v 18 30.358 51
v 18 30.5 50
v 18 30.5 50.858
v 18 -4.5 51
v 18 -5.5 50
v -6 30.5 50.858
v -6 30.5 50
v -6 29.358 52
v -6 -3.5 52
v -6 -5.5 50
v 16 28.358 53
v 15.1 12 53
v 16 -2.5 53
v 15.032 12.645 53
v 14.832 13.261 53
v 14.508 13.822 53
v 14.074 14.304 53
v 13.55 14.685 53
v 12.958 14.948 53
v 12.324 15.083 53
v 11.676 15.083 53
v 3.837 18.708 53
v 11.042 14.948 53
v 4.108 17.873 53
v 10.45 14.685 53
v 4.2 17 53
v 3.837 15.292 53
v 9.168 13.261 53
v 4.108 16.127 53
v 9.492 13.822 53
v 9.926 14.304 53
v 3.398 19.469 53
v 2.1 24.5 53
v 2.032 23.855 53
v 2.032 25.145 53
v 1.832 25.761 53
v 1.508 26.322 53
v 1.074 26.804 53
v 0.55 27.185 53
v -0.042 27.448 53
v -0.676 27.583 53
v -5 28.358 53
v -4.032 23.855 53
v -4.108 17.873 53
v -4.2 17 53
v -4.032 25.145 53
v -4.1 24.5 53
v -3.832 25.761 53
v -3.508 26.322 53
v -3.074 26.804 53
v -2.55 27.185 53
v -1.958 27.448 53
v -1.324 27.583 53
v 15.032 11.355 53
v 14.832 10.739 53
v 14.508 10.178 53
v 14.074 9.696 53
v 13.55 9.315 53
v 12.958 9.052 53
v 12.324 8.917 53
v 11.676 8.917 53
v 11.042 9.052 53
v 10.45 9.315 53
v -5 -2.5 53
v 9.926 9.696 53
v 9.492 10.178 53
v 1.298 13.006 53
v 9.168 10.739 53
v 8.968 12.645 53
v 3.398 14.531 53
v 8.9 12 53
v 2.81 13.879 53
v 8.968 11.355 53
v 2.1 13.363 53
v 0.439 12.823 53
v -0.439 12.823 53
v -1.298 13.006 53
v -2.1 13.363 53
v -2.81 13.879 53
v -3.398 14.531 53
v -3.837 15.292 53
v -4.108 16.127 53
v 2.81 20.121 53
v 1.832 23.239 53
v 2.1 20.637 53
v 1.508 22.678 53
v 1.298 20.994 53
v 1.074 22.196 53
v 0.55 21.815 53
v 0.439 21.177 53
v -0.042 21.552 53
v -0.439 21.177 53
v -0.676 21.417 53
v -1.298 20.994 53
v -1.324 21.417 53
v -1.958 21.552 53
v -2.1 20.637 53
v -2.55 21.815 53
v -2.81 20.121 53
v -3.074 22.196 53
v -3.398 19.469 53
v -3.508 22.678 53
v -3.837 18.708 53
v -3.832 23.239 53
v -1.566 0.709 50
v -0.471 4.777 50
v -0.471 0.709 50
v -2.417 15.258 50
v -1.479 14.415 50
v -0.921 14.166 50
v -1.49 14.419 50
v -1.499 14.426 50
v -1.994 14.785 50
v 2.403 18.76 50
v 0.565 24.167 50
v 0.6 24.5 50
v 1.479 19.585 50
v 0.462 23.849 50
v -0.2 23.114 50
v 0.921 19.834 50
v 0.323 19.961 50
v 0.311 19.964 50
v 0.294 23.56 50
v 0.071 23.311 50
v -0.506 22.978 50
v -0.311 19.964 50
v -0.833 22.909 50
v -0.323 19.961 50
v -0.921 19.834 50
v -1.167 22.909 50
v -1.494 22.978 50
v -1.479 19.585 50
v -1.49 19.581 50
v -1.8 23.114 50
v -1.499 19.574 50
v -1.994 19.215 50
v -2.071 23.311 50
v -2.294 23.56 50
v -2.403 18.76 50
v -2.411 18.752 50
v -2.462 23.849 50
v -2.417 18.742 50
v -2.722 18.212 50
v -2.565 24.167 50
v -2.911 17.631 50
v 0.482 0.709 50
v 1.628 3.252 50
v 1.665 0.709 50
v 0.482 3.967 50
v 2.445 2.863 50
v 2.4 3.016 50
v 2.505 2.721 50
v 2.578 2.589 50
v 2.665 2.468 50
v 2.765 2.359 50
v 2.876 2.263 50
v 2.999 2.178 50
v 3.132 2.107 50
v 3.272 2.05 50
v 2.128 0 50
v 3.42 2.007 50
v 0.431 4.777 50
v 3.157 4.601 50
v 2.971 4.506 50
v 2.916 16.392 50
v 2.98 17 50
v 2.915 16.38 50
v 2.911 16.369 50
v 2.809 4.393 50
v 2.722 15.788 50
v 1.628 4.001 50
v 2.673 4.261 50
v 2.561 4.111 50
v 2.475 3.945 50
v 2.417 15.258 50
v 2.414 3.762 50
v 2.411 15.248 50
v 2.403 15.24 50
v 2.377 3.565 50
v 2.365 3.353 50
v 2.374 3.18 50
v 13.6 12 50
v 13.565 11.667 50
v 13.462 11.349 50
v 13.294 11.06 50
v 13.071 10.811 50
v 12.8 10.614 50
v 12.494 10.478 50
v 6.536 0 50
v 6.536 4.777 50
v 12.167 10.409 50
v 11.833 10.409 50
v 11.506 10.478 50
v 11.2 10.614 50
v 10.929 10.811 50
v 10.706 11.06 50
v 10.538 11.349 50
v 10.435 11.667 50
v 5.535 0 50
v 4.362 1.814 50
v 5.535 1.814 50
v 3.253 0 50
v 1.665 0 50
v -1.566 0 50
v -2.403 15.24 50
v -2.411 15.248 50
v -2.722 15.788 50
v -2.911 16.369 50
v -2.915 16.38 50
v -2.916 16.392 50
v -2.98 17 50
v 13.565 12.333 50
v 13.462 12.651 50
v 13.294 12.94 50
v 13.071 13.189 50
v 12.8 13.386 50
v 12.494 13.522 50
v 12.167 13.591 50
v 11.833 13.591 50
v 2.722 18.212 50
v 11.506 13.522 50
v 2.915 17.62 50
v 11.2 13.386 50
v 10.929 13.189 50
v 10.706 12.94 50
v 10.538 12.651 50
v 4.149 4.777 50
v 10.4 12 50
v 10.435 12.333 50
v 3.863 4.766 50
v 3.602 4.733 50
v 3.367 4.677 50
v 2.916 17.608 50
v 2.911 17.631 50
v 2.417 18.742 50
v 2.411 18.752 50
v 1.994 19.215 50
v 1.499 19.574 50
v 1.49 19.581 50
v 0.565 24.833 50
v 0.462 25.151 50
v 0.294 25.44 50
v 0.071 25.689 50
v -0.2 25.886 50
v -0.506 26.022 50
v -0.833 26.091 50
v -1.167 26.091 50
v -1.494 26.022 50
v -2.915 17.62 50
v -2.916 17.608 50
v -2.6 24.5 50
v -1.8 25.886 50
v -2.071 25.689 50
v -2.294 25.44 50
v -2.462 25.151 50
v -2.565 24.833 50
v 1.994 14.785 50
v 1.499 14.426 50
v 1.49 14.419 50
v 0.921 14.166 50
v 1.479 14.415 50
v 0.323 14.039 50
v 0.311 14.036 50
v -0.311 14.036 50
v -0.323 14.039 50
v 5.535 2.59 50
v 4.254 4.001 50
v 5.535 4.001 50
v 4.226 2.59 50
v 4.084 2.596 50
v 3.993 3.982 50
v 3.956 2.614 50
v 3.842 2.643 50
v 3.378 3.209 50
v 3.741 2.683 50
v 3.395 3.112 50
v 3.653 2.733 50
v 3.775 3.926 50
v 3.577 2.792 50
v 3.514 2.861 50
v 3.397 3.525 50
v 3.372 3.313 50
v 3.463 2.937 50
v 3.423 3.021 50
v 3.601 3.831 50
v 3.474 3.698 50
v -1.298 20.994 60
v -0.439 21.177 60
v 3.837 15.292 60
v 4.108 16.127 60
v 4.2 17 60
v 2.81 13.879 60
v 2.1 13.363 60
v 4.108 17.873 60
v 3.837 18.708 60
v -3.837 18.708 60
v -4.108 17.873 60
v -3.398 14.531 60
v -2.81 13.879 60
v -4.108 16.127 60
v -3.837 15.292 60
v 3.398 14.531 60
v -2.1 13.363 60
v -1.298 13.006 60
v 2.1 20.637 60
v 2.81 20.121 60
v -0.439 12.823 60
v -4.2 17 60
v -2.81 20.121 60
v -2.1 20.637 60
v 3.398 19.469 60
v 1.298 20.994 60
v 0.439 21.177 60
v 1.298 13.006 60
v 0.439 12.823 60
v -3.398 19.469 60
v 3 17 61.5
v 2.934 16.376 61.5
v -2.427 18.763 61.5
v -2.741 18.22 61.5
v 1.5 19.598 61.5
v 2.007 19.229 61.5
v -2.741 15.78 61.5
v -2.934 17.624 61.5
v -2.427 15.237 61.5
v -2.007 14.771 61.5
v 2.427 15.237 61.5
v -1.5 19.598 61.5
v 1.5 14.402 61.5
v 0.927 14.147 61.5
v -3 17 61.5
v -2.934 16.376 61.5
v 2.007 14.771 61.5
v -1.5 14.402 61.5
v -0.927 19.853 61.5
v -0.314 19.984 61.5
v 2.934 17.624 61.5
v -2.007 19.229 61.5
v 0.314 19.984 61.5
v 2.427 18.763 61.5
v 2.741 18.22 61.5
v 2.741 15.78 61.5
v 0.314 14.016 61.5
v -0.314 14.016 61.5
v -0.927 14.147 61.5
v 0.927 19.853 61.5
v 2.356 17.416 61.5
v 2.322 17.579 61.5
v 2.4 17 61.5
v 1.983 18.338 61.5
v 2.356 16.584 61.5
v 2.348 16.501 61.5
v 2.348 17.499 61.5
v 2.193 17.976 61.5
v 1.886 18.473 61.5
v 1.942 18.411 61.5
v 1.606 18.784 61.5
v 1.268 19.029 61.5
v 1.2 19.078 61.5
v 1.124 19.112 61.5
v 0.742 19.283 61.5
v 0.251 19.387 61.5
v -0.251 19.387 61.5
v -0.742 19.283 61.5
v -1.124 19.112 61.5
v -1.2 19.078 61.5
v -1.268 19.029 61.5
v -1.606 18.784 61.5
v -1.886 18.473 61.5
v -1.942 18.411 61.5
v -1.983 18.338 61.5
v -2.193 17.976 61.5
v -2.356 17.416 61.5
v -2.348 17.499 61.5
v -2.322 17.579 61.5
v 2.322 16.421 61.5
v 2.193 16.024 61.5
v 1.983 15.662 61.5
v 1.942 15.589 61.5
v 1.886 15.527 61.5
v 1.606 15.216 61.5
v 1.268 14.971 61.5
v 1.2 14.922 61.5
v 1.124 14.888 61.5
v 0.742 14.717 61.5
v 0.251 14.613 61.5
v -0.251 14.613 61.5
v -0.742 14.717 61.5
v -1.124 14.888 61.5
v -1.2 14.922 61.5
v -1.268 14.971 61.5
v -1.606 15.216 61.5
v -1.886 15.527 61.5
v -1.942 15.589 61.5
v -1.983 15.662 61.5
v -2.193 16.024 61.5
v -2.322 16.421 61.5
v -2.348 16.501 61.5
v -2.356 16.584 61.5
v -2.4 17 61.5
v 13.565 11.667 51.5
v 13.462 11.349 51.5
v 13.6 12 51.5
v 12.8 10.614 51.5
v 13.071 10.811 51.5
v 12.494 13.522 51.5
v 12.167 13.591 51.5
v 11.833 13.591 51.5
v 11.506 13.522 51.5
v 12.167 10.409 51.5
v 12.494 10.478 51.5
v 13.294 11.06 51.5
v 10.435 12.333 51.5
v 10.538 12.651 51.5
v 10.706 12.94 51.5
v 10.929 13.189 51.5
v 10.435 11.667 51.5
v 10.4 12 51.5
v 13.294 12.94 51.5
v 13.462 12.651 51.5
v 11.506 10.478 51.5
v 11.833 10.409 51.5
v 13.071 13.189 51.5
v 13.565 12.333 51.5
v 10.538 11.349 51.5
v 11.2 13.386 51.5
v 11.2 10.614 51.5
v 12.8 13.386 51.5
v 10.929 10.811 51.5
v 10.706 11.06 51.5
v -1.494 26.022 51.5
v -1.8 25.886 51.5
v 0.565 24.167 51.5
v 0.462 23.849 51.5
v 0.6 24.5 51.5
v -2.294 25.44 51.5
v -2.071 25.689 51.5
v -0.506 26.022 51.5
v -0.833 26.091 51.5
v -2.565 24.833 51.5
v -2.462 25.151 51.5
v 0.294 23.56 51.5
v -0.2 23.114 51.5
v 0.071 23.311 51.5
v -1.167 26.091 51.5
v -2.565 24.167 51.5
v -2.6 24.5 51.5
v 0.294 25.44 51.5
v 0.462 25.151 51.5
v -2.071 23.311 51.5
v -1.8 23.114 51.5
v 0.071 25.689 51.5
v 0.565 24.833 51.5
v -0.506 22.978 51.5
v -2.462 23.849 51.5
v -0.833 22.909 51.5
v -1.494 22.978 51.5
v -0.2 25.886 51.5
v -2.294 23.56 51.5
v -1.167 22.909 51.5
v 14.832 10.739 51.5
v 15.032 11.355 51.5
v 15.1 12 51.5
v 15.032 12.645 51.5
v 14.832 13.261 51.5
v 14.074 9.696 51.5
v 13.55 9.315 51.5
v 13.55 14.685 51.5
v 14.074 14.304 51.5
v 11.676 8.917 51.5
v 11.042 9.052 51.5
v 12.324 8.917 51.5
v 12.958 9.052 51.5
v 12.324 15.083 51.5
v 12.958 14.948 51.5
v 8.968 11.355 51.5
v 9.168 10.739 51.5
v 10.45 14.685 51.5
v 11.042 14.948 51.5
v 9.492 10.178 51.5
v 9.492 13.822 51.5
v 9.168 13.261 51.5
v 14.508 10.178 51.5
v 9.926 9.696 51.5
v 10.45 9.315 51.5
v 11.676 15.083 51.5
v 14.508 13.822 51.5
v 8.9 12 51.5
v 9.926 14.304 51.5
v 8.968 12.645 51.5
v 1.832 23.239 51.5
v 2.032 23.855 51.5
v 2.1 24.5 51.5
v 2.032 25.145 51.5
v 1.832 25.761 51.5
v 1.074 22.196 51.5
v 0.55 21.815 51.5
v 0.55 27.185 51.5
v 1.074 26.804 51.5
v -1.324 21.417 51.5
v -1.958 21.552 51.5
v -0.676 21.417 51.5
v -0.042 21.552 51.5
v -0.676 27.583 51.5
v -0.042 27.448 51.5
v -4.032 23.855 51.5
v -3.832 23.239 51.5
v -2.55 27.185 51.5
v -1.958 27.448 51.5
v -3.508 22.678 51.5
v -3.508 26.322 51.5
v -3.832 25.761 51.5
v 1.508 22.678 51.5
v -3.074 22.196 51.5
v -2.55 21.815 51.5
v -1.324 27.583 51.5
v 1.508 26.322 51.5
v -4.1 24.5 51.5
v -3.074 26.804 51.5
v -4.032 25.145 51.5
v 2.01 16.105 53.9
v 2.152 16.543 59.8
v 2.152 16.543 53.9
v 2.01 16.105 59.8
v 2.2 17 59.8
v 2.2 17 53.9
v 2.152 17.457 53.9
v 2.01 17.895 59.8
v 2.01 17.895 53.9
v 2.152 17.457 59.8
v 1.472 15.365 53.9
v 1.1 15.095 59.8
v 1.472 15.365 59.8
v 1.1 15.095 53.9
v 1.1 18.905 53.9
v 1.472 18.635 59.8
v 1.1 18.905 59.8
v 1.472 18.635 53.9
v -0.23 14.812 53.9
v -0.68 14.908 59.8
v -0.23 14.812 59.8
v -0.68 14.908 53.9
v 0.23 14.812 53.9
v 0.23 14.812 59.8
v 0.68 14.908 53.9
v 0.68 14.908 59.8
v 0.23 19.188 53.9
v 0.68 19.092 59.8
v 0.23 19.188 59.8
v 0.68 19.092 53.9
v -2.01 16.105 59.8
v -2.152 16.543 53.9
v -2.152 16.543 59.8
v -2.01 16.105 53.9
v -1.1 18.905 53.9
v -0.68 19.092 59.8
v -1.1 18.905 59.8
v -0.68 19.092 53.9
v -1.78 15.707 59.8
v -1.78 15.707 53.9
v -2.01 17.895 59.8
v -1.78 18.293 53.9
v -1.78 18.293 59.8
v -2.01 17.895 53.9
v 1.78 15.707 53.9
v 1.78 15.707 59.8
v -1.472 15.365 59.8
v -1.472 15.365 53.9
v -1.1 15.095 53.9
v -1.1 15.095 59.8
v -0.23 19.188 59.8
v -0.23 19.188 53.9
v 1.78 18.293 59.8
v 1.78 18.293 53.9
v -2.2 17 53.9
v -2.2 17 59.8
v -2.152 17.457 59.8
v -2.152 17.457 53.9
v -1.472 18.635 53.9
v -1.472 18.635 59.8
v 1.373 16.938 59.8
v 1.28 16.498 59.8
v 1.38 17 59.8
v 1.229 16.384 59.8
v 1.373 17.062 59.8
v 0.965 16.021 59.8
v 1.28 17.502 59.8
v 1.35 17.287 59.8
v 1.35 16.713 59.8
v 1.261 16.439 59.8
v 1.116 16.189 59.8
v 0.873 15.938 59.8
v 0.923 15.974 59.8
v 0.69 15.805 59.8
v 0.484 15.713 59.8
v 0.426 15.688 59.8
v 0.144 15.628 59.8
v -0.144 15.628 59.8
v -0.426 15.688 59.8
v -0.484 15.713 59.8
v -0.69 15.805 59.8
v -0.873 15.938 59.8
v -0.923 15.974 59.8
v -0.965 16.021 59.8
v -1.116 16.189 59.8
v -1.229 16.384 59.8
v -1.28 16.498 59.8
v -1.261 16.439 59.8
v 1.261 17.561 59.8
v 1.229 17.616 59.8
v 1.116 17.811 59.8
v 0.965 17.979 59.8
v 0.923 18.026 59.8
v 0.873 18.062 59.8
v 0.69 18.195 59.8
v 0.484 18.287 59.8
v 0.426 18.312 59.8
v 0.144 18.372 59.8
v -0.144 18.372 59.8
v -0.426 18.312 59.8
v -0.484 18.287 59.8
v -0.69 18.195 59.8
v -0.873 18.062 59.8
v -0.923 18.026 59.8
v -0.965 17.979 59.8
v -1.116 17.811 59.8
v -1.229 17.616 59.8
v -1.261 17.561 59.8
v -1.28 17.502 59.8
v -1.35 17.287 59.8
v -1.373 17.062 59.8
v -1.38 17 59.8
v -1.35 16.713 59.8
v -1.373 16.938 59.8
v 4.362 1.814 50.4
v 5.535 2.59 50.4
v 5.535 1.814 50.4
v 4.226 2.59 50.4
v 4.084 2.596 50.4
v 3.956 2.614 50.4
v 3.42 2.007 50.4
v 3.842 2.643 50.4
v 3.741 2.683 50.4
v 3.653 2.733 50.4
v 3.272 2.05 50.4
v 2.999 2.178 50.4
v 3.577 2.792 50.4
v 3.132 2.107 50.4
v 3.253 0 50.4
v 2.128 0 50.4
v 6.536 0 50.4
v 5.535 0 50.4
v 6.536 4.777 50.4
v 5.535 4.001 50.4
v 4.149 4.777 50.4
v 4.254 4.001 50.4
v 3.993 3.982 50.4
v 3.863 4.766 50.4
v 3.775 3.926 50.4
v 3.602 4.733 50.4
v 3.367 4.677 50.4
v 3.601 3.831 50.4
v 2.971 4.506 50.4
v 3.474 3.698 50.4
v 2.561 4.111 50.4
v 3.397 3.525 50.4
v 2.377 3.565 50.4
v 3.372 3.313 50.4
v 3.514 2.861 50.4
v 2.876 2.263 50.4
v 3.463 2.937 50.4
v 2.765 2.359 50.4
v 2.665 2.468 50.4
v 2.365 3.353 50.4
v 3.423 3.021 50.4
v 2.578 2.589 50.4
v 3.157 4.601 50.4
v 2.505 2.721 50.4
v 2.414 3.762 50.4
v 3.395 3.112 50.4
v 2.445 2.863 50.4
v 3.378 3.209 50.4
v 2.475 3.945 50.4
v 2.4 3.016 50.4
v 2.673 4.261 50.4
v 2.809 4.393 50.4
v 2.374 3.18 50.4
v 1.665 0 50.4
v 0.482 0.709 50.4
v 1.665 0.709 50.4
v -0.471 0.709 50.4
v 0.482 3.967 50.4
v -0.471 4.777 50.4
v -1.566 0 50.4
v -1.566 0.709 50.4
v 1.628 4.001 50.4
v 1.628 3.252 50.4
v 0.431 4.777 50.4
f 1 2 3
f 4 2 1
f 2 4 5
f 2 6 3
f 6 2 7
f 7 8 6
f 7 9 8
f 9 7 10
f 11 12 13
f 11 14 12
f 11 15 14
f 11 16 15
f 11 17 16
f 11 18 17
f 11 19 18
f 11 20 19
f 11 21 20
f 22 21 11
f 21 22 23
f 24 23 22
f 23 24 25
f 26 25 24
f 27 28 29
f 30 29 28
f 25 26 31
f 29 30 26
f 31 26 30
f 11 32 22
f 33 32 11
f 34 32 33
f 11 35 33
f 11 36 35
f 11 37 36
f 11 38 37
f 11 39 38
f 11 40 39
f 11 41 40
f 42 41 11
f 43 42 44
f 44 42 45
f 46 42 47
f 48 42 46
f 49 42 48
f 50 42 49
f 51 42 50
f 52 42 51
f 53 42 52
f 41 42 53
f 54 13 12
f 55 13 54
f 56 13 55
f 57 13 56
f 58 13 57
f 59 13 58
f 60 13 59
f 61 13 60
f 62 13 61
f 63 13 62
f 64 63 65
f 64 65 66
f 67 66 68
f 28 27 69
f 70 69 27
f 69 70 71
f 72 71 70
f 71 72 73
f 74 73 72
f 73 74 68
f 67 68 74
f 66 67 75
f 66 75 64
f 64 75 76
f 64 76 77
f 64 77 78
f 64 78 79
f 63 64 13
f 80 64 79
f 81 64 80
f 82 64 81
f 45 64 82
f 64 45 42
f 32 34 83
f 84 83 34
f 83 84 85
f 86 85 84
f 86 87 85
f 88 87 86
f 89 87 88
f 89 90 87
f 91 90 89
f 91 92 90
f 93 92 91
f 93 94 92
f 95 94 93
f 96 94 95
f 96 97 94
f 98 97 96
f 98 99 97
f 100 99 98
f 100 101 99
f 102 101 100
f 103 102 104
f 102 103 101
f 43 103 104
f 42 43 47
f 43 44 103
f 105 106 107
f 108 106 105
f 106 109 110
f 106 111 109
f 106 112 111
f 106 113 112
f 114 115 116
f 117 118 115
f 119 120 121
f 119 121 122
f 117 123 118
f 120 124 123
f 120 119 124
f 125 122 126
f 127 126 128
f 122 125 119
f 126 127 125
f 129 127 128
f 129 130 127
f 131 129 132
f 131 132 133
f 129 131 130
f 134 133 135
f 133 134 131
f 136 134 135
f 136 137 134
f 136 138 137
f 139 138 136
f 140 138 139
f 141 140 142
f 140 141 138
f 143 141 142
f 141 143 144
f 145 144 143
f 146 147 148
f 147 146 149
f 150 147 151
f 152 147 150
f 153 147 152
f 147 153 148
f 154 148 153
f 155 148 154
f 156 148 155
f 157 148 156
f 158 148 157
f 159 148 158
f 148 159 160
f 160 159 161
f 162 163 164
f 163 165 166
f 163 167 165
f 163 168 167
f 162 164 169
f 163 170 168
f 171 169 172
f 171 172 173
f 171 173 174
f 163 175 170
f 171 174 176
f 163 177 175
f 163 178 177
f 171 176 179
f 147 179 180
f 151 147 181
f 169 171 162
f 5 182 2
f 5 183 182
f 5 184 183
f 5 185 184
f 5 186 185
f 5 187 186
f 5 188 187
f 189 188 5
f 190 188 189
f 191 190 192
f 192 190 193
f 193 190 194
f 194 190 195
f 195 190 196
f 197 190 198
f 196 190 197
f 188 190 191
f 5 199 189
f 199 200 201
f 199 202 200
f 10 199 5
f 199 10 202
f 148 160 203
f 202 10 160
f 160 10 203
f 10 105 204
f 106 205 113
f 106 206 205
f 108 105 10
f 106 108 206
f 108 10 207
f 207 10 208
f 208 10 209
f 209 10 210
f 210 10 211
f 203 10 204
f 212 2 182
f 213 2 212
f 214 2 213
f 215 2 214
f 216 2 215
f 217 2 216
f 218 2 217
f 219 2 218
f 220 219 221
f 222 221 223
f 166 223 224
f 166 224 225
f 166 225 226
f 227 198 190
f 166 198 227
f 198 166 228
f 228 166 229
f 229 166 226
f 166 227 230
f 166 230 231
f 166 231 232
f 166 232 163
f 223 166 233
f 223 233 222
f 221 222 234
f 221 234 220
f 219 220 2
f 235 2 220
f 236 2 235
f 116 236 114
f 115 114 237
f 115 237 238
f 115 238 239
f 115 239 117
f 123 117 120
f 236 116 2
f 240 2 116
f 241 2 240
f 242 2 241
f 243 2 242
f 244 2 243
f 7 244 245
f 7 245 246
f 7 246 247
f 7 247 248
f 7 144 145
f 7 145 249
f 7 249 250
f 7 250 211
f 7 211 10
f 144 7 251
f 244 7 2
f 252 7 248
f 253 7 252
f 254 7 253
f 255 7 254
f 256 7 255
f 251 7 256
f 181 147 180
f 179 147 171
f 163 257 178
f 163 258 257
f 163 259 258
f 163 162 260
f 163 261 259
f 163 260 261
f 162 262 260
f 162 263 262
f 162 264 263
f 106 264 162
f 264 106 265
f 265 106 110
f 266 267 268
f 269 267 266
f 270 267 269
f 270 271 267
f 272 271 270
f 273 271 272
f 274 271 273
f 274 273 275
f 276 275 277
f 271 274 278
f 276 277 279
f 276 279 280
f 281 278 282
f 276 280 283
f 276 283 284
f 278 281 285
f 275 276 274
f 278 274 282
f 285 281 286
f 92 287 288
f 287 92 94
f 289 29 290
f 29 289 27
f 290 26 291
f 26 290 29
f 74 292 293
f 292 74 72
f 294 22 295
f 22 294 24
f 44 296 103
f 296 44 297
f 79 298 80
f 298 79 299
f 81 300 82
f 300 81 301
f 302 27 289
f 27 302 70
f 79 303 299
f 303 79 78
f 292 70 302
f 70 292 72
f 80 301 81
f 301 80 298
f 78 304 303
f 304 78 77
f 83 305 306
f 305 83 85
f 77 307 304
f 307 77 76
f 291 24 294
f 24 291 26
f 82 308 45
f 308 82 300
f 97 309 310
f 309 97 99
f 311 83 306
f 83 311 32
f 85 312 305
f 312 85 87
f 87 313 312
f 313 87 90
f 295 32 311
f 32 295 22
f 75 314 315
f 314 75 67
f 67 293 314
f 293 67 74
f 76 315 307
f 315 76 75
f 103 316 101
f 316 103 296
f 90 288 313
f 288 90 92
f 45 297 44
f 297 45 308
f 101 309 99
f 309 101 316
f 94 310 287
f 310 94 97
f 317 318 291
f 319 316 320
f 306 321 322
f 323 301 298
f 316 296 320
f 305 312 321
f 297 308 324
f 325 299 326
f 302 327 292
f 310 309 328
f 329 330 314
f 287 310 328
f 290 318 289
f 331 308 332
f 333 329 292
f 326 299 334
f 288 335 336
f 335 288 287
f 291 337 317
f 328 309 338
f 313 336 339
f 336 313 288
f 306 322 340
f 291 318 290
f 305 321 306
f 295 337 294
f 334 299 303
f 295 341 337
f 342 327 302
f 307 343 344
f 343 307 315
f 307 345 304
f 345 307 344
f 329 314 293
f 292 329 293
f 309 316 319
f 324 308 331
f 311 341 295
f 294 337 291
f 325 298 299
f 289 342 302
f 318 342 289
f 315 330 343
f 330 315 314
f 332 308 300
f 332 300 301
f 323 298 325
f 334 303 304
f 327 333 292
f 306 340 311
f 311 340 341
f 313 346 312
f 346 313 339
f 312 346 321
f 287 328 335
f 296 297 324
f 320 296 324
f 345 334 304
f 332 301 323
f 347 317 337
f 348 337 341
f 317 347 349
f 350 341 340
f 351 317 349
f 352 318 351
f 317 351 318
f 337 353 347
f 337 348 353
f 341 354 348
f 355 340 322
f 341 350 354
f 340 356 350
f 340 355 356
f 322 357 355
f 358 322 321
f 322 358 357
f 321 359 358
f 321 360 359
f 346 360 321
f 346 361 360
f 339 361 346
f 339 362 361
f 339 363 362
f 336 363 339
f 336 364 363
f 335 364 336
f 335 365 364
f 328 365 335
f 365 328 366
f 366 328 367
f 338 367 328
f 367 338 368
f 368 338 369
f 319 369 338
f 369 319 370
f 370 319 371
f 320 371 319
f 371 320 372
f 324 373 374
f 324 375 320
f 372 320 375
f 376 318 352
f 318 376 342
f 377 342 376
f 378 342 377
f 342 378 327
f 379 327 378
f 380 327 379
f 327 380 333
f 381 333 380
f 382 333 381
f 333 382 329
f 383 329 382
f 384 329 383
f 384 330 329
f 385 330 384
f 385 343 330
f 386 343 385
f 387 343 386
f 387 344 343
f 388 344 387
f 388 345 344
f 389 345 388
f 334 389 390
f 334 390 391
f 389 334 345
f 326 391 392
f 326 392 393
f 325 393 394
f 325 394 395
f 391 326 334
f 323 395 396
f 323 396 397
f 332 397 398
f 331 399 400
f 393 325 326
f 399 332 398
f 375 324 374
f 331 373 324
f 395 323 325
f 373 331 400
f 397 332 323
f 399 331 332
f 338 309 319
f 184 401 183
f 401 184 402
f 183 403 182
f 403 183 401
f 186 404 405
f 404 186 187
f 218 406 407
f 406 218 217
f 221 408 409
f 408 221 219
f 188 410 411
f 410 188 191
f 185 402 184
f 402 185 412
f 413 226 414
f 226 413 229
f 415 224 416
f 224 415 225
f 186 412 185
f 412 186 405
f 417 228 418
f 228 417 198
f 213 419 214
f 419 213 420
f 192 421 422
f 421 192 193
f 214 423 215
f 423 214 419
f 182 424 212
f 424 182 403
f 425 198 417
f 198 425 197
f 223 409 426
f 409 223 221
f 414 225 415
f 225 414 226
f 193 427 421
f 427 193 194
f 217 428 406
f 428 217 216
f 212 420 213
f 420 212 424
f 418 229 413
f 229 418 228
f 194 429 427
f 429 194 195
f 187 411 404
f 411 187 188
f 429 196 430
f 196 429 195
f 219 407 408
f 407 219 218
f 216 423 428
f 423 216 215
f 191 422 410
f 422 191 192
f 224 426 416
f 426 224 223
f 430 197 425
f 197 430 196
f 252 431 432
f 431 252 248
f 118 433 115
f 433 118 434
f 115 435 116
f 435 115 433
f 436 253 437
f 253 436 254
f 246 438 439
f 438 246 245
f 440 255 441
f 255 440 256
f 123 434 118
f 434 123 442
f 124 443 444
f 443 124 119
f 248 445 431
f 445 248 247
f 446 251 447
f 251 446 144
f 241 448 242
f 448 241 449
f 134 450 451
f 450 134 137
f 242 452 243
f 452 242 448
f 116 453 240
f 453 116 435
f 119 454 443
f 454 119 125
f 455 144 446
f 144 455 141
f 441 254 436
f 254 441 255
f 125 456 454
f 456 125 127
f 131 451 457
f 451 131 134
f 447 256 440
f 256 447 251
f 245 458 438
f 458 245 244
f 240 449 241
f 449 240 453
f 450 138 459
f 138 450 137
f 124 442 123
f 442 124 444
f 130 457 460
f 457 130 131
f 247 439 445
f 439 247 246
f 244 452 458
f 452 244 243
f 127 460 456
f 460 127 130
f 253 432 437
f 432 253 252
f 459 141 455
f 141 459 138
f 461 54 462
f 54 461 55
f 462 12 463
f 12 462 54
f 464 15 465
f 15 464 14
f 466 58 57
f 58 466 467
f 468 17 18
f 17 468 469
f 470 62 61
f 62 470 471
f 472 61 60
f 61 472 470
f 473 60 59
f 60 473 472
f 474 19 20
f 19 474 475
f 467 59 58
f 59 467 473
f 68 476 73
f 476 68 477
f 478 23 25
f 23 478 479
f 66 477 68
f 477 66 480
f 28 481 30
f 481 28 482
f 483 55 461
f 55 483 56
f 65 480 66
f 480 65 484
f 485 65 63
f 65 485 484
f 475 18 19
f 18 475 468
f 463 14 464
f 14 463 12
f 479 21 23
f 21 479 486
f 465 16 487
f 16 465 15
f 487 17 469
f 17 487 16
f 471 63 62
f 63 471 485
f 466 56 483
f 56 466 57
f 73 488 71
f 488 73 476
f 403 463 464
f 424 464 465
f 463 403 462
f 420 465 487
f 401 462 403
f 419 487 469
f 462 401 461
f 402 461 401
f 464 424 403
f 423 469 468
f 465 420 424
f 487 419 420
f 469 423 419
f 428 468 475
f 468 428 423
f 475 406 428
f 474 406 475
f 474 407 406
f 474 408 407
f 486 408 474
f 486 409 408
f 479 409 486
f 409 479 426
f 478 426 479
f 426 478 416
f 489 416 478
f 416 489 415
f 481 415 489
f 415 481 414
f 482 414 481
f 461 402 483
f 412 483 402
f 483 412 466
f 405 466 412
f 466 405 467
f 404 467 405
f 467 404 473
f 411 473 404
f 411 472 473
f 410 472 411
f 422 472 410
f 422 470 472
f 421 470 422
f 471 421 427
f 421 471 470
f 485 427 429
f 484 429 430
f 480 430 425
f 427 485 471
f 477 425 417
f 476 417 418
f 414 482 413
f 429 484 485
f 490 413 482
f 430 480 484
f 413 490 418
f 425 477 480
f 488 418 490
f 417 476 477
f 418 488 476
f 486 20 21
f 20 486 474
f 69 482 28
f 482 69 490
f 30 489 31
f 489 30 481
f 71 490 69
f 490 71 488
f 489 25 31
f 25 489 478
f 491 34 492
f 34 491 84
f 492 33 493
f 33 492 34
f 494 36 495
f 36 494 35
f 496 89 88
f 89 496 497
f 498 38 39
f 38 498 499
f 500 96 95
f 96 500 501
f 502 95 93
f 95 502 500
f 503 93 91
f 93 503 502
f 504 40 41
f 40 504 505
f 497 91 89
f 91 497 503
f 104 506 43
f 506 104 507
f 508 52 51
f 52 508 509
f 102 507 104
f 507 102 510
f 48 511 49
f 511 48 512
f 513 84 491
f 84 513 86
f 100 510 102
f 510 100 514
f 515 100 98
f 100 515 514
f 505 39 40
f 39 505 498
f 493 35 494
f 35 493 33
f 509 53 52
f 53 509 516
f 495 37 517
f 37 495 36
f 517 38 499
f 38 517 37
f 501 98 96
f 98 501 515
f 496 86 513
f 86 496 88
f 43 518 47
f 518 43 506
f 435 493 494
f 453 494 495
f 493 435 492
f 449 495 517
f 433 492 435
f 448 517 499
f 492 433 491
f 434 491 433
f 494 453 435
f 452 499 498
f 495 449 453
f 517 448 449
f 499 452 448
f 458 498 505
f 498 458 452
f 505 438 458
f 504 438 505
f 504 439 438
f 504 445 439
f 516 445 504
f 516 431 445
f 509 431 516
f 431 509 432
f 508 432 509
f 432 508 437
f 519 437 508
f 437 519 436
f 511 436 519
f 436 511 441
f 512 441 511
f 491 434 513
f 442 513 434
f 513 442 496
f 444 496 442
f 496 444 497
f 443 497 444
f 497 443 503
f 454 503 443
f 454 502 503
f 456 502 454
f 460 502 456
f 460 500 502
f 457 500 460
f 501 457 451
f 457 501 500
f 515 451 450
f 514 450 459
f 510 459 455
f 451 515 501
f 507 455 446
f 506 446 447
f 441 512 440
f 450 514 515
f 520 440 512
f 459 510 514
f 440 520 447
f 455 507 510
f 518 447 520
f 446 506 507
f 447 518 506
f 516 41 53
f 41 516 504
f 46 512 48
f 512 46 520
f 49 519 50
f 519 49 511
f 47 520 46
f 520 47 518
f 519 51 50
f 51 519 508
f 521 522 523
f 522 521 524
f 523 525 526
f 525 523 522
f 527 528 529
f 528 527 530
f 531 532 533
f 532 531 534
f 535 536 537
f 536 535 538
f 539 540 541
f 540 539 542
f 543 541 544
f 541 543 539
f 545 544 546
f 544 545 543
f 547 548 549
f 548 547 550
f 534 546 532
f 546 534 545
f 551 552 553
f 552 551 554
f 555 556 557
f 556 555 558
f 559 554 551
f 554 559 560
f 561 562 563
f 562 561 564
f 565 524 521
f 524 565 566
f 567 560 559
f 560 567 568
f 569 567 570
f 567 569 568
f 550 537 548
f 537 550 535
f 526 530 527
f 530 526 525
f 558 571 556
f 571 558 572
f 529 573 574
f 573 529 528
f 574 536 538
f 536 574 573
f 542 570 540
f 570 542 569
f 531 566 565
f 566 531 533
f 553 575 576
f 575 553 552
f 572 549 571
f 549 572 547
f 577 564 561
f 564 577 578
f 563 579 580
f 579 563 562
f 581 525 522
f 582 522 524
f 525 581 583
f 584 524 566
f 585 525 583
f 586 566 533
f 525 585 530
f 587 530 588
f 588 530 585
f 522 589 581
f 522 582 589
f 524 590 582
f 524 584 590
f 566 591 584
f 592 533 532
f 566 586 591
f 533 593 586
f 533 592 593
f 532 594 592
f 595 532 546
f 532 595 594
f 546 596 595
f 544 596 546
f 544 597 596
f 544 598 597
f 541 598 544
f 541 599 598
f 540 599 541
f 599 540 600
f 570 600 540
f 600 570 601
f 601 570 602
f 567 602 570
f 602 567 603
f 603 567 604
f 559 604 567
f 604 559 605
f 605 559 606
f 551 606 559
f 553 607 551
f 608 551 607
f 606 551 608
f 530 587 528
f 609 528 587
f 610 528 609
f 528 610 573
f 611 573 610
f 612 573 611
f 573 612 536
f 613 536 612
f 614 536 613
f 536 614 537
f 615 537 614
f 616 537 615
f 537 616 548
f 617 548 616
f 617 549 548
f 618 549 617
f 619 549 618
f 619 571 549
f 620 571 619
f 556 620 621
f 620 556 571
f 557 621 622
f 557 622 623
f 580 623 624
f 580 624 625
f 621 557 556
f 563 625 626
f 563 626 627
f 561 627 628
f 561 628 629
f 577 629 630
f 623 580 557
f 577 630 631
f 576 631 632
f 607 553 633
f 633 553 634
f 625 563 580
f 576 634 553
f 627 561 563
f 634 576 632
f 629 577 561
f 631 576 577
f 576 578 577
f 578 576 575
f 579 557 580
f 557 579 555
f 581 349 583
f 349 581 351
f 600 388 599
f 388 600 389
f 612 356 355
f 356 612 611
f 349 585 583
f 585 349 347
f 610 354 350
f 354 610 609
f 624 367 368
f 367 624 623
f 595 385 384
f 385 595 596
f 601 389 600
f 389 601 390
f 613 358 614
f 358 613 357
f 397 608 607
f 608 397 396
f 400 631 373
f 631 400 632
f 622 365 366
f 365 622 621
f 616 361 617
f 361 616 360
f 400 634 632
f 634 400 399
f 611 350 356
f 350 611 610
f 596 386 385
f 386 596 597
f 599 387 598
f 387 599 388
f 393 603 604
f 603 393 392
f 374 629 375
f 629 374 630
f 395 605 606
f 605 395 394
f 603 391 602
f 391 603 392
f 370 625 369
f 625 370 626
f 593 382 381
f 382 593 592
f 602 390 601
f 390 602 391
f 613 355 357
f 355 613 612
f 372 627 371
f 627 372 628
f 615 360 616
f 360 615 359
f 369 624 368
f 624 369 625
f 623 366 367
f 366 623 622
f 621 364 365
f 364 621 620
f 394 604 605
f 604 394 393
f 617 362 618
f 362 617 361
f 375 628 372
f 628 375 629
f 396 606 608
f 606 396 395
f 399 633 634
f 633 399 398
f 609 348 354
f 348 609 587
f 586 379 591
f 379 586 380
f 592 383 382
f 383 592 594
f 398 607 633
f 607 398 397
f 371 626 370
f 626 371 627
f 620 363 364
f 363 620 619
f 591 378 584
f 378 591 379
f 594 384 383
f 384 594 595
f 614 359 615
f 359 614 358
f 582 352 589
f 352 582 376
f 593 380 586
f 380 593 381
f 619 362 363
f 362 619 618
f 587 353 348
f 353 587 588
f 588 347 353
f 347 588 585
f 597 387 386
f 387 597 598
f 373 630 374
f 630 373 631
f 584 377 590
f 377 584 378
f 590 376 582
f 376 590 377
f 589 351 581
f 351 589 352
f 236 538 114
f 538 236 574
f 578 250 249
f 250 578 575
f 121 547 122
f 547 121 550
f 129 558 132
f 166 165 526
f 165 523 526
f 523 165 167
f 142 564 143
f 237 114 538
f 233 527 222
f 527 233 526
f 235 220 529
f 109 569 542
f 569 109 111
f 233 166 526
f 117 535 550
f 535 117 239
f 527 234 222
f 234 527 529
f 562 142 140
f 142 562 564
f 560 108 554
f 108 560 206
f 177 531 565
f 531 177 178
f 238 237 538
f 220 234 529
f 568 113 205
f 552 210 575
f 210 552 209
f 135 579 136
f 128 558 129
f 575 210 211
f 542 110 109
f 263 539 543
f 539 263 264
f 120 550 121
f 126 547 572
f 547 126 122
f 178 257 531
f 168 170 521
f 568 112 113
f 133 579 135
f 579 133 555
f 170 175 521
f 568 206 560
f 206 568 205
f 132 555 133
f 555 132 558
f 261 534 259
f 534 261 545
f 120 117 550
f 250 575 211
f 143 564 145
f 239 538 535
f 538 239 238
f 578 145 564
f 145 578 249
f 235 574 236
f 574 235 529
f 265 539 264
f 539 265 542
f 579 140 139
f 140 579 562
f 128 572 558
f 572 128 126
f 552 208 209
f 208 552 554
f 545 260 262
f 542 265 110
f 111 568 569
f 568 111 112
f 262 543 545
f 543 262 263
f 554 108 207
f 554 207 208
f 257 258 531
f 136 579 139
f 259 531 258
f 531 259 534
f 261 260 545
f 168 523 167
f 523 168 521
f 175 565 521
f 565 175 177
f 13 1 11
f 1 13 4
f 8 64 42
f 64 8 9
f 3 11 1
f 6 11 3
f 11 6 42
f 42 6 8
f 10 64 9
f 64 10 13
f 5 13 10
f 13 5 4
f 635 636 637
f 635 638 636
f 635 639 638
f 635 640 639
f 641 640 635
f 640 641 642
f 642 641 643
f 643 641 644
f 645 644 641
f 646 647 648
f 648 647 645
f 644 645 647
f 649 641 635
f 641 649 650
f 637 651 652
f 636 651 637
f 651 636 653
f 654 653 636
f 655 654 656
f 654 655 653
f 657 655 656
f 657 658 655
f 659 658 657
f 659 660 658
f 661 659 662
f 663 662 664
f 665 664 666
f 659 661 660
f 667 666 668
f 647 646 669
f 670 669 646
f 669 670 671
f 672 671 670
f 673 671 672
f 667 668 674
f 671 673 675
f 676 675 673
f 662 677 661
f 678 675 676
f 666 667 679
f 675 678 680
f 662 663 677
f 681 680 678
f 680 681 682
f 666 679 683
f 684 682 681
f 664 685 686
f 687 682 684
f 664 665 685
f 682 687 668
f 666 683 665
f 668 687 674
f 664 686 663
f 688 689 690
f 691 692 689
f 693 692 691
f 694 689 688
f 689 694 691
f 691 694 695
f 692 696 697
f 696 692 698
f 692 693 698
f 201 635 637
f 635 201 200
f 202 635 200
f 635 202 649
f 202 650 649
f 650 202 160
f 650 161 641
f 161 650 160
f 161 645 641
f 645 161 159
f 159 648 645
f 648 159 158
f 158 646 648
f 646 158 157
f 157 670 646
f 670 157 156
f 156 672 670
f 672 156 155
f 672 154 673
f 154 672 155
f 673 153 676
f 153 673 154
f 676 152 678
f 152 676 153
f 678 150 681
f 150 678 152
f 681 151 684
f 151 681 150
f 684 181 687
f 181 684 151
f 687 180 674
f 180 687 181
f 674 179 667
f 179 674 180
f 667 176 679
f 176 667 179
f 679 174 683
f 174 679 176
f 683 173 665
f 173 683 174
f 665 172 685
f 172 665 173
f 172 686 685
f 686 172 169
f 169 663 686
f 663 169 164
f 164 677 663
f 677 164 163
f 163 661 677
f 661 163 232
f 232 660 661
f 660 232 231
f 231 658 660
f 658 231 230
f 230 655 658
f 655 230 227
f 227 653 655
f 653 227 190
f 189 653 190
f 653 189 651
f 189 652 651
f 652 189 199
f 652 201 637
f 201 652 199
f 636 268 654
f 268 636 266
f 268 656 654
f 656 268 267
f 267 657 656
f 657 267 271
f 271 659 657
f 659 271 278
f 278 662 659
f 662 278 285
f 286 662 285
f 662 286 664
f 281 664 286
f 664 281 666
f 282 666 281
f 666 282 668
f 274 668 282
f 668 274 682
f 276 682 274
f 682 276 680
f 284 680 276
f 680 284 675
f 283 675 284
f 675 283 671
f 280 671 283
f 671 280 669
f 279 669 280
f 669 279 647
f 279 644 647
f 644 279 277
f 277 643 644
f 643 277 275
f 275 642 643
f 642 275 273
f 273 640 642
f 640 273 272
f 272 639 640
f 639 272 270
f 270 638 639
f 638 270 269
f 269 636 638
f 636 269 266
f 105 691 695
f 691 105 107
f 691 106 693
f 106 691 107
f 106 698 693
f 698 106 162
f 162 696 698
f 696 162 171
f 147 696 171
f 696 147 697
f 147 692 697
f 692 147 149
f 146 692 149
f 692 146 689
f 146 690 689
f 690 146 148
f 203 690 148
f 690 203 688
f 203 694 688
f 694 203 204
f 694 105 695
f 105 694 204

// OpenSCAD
// PRUSA iteration4
// Filament sensor cover
// GNU GPL v3
// Josef Průša <iam@josefprusa.cz> and contributors
// http://www.reprap.org/wiki/Prusa_Mendel
// http://prusamendel.org

module part()
{
    difference()
    {
        union()
            {   
                // base shape
                translate([-6,50,-30.5]) cube([24,3,36]);
                translate([0,60,-17]) rotate([90,0,0]) cylinder(r=4.2,h = 10, $fn=30); 
                translate([0,61.5,-17]) rotate([90,0,0]) cylinder(r1=3, r2=4.2, h=1.5, $fn=30); 
            }
            
            // mounting screws
            translate([12,60,-12]) rotate([90,0,0]) cylinder(r=1.6,h = 20, $fn=30); 
            translate([-1,60,-24.5]) rotate([90,0,0]) cylinder(r=1.6,h = 20, $fn=30); 
                
            translate([12,54.5,-12]) rotate([90,0,0]) cylinder(r=3.1,h = 3, $fn=30); 
            translate([-1,54.5,-24.5]) rotate([90,0,0]) cylinder(r=3.1,h = 3, $fn=30); 

            // filament guide
            translate([0,59.8,-17]) rotate([90,0,0]) cylinder(r=2.2,h = 9.8, $fn=30); 
            translate([0,61,-17]) rotate([90,0,0]) cylinder(r=1,h = 20, $fn=30);     
            translate([0,62.5,-17]) rotate([90,0,0]) cylinder(r2=1.2, r1=3,h = 3, $fn=30);     
            translate([0,53.9,-17]) rotate([90,0,0]) cylinder(r1=2.2, r2=3,h = 4, $fn=30);     
                
                
            // nice edges    
            translate([19,50,-40]) rotate([0,0,45]) cube([10,10,50]);
            translate([-9,49,-38]) rotate([0,0,45]) cube([6,5,50]);
            translate([-8,56.5,-39]) rotate([45,0,0]) cube([50,10,10]);
            translate([-8,56.5,-1]) rotate([45,0,0]) cube([50,10,10]);


        translate([7,50.4,0]) rotate([90,180,0]) linear_extrude(height = 0.6) 
        { text("R1",font = "helvetica:style=Bold", size=5, center=true); }
    }
}


rotate([90,0,0]) part();
